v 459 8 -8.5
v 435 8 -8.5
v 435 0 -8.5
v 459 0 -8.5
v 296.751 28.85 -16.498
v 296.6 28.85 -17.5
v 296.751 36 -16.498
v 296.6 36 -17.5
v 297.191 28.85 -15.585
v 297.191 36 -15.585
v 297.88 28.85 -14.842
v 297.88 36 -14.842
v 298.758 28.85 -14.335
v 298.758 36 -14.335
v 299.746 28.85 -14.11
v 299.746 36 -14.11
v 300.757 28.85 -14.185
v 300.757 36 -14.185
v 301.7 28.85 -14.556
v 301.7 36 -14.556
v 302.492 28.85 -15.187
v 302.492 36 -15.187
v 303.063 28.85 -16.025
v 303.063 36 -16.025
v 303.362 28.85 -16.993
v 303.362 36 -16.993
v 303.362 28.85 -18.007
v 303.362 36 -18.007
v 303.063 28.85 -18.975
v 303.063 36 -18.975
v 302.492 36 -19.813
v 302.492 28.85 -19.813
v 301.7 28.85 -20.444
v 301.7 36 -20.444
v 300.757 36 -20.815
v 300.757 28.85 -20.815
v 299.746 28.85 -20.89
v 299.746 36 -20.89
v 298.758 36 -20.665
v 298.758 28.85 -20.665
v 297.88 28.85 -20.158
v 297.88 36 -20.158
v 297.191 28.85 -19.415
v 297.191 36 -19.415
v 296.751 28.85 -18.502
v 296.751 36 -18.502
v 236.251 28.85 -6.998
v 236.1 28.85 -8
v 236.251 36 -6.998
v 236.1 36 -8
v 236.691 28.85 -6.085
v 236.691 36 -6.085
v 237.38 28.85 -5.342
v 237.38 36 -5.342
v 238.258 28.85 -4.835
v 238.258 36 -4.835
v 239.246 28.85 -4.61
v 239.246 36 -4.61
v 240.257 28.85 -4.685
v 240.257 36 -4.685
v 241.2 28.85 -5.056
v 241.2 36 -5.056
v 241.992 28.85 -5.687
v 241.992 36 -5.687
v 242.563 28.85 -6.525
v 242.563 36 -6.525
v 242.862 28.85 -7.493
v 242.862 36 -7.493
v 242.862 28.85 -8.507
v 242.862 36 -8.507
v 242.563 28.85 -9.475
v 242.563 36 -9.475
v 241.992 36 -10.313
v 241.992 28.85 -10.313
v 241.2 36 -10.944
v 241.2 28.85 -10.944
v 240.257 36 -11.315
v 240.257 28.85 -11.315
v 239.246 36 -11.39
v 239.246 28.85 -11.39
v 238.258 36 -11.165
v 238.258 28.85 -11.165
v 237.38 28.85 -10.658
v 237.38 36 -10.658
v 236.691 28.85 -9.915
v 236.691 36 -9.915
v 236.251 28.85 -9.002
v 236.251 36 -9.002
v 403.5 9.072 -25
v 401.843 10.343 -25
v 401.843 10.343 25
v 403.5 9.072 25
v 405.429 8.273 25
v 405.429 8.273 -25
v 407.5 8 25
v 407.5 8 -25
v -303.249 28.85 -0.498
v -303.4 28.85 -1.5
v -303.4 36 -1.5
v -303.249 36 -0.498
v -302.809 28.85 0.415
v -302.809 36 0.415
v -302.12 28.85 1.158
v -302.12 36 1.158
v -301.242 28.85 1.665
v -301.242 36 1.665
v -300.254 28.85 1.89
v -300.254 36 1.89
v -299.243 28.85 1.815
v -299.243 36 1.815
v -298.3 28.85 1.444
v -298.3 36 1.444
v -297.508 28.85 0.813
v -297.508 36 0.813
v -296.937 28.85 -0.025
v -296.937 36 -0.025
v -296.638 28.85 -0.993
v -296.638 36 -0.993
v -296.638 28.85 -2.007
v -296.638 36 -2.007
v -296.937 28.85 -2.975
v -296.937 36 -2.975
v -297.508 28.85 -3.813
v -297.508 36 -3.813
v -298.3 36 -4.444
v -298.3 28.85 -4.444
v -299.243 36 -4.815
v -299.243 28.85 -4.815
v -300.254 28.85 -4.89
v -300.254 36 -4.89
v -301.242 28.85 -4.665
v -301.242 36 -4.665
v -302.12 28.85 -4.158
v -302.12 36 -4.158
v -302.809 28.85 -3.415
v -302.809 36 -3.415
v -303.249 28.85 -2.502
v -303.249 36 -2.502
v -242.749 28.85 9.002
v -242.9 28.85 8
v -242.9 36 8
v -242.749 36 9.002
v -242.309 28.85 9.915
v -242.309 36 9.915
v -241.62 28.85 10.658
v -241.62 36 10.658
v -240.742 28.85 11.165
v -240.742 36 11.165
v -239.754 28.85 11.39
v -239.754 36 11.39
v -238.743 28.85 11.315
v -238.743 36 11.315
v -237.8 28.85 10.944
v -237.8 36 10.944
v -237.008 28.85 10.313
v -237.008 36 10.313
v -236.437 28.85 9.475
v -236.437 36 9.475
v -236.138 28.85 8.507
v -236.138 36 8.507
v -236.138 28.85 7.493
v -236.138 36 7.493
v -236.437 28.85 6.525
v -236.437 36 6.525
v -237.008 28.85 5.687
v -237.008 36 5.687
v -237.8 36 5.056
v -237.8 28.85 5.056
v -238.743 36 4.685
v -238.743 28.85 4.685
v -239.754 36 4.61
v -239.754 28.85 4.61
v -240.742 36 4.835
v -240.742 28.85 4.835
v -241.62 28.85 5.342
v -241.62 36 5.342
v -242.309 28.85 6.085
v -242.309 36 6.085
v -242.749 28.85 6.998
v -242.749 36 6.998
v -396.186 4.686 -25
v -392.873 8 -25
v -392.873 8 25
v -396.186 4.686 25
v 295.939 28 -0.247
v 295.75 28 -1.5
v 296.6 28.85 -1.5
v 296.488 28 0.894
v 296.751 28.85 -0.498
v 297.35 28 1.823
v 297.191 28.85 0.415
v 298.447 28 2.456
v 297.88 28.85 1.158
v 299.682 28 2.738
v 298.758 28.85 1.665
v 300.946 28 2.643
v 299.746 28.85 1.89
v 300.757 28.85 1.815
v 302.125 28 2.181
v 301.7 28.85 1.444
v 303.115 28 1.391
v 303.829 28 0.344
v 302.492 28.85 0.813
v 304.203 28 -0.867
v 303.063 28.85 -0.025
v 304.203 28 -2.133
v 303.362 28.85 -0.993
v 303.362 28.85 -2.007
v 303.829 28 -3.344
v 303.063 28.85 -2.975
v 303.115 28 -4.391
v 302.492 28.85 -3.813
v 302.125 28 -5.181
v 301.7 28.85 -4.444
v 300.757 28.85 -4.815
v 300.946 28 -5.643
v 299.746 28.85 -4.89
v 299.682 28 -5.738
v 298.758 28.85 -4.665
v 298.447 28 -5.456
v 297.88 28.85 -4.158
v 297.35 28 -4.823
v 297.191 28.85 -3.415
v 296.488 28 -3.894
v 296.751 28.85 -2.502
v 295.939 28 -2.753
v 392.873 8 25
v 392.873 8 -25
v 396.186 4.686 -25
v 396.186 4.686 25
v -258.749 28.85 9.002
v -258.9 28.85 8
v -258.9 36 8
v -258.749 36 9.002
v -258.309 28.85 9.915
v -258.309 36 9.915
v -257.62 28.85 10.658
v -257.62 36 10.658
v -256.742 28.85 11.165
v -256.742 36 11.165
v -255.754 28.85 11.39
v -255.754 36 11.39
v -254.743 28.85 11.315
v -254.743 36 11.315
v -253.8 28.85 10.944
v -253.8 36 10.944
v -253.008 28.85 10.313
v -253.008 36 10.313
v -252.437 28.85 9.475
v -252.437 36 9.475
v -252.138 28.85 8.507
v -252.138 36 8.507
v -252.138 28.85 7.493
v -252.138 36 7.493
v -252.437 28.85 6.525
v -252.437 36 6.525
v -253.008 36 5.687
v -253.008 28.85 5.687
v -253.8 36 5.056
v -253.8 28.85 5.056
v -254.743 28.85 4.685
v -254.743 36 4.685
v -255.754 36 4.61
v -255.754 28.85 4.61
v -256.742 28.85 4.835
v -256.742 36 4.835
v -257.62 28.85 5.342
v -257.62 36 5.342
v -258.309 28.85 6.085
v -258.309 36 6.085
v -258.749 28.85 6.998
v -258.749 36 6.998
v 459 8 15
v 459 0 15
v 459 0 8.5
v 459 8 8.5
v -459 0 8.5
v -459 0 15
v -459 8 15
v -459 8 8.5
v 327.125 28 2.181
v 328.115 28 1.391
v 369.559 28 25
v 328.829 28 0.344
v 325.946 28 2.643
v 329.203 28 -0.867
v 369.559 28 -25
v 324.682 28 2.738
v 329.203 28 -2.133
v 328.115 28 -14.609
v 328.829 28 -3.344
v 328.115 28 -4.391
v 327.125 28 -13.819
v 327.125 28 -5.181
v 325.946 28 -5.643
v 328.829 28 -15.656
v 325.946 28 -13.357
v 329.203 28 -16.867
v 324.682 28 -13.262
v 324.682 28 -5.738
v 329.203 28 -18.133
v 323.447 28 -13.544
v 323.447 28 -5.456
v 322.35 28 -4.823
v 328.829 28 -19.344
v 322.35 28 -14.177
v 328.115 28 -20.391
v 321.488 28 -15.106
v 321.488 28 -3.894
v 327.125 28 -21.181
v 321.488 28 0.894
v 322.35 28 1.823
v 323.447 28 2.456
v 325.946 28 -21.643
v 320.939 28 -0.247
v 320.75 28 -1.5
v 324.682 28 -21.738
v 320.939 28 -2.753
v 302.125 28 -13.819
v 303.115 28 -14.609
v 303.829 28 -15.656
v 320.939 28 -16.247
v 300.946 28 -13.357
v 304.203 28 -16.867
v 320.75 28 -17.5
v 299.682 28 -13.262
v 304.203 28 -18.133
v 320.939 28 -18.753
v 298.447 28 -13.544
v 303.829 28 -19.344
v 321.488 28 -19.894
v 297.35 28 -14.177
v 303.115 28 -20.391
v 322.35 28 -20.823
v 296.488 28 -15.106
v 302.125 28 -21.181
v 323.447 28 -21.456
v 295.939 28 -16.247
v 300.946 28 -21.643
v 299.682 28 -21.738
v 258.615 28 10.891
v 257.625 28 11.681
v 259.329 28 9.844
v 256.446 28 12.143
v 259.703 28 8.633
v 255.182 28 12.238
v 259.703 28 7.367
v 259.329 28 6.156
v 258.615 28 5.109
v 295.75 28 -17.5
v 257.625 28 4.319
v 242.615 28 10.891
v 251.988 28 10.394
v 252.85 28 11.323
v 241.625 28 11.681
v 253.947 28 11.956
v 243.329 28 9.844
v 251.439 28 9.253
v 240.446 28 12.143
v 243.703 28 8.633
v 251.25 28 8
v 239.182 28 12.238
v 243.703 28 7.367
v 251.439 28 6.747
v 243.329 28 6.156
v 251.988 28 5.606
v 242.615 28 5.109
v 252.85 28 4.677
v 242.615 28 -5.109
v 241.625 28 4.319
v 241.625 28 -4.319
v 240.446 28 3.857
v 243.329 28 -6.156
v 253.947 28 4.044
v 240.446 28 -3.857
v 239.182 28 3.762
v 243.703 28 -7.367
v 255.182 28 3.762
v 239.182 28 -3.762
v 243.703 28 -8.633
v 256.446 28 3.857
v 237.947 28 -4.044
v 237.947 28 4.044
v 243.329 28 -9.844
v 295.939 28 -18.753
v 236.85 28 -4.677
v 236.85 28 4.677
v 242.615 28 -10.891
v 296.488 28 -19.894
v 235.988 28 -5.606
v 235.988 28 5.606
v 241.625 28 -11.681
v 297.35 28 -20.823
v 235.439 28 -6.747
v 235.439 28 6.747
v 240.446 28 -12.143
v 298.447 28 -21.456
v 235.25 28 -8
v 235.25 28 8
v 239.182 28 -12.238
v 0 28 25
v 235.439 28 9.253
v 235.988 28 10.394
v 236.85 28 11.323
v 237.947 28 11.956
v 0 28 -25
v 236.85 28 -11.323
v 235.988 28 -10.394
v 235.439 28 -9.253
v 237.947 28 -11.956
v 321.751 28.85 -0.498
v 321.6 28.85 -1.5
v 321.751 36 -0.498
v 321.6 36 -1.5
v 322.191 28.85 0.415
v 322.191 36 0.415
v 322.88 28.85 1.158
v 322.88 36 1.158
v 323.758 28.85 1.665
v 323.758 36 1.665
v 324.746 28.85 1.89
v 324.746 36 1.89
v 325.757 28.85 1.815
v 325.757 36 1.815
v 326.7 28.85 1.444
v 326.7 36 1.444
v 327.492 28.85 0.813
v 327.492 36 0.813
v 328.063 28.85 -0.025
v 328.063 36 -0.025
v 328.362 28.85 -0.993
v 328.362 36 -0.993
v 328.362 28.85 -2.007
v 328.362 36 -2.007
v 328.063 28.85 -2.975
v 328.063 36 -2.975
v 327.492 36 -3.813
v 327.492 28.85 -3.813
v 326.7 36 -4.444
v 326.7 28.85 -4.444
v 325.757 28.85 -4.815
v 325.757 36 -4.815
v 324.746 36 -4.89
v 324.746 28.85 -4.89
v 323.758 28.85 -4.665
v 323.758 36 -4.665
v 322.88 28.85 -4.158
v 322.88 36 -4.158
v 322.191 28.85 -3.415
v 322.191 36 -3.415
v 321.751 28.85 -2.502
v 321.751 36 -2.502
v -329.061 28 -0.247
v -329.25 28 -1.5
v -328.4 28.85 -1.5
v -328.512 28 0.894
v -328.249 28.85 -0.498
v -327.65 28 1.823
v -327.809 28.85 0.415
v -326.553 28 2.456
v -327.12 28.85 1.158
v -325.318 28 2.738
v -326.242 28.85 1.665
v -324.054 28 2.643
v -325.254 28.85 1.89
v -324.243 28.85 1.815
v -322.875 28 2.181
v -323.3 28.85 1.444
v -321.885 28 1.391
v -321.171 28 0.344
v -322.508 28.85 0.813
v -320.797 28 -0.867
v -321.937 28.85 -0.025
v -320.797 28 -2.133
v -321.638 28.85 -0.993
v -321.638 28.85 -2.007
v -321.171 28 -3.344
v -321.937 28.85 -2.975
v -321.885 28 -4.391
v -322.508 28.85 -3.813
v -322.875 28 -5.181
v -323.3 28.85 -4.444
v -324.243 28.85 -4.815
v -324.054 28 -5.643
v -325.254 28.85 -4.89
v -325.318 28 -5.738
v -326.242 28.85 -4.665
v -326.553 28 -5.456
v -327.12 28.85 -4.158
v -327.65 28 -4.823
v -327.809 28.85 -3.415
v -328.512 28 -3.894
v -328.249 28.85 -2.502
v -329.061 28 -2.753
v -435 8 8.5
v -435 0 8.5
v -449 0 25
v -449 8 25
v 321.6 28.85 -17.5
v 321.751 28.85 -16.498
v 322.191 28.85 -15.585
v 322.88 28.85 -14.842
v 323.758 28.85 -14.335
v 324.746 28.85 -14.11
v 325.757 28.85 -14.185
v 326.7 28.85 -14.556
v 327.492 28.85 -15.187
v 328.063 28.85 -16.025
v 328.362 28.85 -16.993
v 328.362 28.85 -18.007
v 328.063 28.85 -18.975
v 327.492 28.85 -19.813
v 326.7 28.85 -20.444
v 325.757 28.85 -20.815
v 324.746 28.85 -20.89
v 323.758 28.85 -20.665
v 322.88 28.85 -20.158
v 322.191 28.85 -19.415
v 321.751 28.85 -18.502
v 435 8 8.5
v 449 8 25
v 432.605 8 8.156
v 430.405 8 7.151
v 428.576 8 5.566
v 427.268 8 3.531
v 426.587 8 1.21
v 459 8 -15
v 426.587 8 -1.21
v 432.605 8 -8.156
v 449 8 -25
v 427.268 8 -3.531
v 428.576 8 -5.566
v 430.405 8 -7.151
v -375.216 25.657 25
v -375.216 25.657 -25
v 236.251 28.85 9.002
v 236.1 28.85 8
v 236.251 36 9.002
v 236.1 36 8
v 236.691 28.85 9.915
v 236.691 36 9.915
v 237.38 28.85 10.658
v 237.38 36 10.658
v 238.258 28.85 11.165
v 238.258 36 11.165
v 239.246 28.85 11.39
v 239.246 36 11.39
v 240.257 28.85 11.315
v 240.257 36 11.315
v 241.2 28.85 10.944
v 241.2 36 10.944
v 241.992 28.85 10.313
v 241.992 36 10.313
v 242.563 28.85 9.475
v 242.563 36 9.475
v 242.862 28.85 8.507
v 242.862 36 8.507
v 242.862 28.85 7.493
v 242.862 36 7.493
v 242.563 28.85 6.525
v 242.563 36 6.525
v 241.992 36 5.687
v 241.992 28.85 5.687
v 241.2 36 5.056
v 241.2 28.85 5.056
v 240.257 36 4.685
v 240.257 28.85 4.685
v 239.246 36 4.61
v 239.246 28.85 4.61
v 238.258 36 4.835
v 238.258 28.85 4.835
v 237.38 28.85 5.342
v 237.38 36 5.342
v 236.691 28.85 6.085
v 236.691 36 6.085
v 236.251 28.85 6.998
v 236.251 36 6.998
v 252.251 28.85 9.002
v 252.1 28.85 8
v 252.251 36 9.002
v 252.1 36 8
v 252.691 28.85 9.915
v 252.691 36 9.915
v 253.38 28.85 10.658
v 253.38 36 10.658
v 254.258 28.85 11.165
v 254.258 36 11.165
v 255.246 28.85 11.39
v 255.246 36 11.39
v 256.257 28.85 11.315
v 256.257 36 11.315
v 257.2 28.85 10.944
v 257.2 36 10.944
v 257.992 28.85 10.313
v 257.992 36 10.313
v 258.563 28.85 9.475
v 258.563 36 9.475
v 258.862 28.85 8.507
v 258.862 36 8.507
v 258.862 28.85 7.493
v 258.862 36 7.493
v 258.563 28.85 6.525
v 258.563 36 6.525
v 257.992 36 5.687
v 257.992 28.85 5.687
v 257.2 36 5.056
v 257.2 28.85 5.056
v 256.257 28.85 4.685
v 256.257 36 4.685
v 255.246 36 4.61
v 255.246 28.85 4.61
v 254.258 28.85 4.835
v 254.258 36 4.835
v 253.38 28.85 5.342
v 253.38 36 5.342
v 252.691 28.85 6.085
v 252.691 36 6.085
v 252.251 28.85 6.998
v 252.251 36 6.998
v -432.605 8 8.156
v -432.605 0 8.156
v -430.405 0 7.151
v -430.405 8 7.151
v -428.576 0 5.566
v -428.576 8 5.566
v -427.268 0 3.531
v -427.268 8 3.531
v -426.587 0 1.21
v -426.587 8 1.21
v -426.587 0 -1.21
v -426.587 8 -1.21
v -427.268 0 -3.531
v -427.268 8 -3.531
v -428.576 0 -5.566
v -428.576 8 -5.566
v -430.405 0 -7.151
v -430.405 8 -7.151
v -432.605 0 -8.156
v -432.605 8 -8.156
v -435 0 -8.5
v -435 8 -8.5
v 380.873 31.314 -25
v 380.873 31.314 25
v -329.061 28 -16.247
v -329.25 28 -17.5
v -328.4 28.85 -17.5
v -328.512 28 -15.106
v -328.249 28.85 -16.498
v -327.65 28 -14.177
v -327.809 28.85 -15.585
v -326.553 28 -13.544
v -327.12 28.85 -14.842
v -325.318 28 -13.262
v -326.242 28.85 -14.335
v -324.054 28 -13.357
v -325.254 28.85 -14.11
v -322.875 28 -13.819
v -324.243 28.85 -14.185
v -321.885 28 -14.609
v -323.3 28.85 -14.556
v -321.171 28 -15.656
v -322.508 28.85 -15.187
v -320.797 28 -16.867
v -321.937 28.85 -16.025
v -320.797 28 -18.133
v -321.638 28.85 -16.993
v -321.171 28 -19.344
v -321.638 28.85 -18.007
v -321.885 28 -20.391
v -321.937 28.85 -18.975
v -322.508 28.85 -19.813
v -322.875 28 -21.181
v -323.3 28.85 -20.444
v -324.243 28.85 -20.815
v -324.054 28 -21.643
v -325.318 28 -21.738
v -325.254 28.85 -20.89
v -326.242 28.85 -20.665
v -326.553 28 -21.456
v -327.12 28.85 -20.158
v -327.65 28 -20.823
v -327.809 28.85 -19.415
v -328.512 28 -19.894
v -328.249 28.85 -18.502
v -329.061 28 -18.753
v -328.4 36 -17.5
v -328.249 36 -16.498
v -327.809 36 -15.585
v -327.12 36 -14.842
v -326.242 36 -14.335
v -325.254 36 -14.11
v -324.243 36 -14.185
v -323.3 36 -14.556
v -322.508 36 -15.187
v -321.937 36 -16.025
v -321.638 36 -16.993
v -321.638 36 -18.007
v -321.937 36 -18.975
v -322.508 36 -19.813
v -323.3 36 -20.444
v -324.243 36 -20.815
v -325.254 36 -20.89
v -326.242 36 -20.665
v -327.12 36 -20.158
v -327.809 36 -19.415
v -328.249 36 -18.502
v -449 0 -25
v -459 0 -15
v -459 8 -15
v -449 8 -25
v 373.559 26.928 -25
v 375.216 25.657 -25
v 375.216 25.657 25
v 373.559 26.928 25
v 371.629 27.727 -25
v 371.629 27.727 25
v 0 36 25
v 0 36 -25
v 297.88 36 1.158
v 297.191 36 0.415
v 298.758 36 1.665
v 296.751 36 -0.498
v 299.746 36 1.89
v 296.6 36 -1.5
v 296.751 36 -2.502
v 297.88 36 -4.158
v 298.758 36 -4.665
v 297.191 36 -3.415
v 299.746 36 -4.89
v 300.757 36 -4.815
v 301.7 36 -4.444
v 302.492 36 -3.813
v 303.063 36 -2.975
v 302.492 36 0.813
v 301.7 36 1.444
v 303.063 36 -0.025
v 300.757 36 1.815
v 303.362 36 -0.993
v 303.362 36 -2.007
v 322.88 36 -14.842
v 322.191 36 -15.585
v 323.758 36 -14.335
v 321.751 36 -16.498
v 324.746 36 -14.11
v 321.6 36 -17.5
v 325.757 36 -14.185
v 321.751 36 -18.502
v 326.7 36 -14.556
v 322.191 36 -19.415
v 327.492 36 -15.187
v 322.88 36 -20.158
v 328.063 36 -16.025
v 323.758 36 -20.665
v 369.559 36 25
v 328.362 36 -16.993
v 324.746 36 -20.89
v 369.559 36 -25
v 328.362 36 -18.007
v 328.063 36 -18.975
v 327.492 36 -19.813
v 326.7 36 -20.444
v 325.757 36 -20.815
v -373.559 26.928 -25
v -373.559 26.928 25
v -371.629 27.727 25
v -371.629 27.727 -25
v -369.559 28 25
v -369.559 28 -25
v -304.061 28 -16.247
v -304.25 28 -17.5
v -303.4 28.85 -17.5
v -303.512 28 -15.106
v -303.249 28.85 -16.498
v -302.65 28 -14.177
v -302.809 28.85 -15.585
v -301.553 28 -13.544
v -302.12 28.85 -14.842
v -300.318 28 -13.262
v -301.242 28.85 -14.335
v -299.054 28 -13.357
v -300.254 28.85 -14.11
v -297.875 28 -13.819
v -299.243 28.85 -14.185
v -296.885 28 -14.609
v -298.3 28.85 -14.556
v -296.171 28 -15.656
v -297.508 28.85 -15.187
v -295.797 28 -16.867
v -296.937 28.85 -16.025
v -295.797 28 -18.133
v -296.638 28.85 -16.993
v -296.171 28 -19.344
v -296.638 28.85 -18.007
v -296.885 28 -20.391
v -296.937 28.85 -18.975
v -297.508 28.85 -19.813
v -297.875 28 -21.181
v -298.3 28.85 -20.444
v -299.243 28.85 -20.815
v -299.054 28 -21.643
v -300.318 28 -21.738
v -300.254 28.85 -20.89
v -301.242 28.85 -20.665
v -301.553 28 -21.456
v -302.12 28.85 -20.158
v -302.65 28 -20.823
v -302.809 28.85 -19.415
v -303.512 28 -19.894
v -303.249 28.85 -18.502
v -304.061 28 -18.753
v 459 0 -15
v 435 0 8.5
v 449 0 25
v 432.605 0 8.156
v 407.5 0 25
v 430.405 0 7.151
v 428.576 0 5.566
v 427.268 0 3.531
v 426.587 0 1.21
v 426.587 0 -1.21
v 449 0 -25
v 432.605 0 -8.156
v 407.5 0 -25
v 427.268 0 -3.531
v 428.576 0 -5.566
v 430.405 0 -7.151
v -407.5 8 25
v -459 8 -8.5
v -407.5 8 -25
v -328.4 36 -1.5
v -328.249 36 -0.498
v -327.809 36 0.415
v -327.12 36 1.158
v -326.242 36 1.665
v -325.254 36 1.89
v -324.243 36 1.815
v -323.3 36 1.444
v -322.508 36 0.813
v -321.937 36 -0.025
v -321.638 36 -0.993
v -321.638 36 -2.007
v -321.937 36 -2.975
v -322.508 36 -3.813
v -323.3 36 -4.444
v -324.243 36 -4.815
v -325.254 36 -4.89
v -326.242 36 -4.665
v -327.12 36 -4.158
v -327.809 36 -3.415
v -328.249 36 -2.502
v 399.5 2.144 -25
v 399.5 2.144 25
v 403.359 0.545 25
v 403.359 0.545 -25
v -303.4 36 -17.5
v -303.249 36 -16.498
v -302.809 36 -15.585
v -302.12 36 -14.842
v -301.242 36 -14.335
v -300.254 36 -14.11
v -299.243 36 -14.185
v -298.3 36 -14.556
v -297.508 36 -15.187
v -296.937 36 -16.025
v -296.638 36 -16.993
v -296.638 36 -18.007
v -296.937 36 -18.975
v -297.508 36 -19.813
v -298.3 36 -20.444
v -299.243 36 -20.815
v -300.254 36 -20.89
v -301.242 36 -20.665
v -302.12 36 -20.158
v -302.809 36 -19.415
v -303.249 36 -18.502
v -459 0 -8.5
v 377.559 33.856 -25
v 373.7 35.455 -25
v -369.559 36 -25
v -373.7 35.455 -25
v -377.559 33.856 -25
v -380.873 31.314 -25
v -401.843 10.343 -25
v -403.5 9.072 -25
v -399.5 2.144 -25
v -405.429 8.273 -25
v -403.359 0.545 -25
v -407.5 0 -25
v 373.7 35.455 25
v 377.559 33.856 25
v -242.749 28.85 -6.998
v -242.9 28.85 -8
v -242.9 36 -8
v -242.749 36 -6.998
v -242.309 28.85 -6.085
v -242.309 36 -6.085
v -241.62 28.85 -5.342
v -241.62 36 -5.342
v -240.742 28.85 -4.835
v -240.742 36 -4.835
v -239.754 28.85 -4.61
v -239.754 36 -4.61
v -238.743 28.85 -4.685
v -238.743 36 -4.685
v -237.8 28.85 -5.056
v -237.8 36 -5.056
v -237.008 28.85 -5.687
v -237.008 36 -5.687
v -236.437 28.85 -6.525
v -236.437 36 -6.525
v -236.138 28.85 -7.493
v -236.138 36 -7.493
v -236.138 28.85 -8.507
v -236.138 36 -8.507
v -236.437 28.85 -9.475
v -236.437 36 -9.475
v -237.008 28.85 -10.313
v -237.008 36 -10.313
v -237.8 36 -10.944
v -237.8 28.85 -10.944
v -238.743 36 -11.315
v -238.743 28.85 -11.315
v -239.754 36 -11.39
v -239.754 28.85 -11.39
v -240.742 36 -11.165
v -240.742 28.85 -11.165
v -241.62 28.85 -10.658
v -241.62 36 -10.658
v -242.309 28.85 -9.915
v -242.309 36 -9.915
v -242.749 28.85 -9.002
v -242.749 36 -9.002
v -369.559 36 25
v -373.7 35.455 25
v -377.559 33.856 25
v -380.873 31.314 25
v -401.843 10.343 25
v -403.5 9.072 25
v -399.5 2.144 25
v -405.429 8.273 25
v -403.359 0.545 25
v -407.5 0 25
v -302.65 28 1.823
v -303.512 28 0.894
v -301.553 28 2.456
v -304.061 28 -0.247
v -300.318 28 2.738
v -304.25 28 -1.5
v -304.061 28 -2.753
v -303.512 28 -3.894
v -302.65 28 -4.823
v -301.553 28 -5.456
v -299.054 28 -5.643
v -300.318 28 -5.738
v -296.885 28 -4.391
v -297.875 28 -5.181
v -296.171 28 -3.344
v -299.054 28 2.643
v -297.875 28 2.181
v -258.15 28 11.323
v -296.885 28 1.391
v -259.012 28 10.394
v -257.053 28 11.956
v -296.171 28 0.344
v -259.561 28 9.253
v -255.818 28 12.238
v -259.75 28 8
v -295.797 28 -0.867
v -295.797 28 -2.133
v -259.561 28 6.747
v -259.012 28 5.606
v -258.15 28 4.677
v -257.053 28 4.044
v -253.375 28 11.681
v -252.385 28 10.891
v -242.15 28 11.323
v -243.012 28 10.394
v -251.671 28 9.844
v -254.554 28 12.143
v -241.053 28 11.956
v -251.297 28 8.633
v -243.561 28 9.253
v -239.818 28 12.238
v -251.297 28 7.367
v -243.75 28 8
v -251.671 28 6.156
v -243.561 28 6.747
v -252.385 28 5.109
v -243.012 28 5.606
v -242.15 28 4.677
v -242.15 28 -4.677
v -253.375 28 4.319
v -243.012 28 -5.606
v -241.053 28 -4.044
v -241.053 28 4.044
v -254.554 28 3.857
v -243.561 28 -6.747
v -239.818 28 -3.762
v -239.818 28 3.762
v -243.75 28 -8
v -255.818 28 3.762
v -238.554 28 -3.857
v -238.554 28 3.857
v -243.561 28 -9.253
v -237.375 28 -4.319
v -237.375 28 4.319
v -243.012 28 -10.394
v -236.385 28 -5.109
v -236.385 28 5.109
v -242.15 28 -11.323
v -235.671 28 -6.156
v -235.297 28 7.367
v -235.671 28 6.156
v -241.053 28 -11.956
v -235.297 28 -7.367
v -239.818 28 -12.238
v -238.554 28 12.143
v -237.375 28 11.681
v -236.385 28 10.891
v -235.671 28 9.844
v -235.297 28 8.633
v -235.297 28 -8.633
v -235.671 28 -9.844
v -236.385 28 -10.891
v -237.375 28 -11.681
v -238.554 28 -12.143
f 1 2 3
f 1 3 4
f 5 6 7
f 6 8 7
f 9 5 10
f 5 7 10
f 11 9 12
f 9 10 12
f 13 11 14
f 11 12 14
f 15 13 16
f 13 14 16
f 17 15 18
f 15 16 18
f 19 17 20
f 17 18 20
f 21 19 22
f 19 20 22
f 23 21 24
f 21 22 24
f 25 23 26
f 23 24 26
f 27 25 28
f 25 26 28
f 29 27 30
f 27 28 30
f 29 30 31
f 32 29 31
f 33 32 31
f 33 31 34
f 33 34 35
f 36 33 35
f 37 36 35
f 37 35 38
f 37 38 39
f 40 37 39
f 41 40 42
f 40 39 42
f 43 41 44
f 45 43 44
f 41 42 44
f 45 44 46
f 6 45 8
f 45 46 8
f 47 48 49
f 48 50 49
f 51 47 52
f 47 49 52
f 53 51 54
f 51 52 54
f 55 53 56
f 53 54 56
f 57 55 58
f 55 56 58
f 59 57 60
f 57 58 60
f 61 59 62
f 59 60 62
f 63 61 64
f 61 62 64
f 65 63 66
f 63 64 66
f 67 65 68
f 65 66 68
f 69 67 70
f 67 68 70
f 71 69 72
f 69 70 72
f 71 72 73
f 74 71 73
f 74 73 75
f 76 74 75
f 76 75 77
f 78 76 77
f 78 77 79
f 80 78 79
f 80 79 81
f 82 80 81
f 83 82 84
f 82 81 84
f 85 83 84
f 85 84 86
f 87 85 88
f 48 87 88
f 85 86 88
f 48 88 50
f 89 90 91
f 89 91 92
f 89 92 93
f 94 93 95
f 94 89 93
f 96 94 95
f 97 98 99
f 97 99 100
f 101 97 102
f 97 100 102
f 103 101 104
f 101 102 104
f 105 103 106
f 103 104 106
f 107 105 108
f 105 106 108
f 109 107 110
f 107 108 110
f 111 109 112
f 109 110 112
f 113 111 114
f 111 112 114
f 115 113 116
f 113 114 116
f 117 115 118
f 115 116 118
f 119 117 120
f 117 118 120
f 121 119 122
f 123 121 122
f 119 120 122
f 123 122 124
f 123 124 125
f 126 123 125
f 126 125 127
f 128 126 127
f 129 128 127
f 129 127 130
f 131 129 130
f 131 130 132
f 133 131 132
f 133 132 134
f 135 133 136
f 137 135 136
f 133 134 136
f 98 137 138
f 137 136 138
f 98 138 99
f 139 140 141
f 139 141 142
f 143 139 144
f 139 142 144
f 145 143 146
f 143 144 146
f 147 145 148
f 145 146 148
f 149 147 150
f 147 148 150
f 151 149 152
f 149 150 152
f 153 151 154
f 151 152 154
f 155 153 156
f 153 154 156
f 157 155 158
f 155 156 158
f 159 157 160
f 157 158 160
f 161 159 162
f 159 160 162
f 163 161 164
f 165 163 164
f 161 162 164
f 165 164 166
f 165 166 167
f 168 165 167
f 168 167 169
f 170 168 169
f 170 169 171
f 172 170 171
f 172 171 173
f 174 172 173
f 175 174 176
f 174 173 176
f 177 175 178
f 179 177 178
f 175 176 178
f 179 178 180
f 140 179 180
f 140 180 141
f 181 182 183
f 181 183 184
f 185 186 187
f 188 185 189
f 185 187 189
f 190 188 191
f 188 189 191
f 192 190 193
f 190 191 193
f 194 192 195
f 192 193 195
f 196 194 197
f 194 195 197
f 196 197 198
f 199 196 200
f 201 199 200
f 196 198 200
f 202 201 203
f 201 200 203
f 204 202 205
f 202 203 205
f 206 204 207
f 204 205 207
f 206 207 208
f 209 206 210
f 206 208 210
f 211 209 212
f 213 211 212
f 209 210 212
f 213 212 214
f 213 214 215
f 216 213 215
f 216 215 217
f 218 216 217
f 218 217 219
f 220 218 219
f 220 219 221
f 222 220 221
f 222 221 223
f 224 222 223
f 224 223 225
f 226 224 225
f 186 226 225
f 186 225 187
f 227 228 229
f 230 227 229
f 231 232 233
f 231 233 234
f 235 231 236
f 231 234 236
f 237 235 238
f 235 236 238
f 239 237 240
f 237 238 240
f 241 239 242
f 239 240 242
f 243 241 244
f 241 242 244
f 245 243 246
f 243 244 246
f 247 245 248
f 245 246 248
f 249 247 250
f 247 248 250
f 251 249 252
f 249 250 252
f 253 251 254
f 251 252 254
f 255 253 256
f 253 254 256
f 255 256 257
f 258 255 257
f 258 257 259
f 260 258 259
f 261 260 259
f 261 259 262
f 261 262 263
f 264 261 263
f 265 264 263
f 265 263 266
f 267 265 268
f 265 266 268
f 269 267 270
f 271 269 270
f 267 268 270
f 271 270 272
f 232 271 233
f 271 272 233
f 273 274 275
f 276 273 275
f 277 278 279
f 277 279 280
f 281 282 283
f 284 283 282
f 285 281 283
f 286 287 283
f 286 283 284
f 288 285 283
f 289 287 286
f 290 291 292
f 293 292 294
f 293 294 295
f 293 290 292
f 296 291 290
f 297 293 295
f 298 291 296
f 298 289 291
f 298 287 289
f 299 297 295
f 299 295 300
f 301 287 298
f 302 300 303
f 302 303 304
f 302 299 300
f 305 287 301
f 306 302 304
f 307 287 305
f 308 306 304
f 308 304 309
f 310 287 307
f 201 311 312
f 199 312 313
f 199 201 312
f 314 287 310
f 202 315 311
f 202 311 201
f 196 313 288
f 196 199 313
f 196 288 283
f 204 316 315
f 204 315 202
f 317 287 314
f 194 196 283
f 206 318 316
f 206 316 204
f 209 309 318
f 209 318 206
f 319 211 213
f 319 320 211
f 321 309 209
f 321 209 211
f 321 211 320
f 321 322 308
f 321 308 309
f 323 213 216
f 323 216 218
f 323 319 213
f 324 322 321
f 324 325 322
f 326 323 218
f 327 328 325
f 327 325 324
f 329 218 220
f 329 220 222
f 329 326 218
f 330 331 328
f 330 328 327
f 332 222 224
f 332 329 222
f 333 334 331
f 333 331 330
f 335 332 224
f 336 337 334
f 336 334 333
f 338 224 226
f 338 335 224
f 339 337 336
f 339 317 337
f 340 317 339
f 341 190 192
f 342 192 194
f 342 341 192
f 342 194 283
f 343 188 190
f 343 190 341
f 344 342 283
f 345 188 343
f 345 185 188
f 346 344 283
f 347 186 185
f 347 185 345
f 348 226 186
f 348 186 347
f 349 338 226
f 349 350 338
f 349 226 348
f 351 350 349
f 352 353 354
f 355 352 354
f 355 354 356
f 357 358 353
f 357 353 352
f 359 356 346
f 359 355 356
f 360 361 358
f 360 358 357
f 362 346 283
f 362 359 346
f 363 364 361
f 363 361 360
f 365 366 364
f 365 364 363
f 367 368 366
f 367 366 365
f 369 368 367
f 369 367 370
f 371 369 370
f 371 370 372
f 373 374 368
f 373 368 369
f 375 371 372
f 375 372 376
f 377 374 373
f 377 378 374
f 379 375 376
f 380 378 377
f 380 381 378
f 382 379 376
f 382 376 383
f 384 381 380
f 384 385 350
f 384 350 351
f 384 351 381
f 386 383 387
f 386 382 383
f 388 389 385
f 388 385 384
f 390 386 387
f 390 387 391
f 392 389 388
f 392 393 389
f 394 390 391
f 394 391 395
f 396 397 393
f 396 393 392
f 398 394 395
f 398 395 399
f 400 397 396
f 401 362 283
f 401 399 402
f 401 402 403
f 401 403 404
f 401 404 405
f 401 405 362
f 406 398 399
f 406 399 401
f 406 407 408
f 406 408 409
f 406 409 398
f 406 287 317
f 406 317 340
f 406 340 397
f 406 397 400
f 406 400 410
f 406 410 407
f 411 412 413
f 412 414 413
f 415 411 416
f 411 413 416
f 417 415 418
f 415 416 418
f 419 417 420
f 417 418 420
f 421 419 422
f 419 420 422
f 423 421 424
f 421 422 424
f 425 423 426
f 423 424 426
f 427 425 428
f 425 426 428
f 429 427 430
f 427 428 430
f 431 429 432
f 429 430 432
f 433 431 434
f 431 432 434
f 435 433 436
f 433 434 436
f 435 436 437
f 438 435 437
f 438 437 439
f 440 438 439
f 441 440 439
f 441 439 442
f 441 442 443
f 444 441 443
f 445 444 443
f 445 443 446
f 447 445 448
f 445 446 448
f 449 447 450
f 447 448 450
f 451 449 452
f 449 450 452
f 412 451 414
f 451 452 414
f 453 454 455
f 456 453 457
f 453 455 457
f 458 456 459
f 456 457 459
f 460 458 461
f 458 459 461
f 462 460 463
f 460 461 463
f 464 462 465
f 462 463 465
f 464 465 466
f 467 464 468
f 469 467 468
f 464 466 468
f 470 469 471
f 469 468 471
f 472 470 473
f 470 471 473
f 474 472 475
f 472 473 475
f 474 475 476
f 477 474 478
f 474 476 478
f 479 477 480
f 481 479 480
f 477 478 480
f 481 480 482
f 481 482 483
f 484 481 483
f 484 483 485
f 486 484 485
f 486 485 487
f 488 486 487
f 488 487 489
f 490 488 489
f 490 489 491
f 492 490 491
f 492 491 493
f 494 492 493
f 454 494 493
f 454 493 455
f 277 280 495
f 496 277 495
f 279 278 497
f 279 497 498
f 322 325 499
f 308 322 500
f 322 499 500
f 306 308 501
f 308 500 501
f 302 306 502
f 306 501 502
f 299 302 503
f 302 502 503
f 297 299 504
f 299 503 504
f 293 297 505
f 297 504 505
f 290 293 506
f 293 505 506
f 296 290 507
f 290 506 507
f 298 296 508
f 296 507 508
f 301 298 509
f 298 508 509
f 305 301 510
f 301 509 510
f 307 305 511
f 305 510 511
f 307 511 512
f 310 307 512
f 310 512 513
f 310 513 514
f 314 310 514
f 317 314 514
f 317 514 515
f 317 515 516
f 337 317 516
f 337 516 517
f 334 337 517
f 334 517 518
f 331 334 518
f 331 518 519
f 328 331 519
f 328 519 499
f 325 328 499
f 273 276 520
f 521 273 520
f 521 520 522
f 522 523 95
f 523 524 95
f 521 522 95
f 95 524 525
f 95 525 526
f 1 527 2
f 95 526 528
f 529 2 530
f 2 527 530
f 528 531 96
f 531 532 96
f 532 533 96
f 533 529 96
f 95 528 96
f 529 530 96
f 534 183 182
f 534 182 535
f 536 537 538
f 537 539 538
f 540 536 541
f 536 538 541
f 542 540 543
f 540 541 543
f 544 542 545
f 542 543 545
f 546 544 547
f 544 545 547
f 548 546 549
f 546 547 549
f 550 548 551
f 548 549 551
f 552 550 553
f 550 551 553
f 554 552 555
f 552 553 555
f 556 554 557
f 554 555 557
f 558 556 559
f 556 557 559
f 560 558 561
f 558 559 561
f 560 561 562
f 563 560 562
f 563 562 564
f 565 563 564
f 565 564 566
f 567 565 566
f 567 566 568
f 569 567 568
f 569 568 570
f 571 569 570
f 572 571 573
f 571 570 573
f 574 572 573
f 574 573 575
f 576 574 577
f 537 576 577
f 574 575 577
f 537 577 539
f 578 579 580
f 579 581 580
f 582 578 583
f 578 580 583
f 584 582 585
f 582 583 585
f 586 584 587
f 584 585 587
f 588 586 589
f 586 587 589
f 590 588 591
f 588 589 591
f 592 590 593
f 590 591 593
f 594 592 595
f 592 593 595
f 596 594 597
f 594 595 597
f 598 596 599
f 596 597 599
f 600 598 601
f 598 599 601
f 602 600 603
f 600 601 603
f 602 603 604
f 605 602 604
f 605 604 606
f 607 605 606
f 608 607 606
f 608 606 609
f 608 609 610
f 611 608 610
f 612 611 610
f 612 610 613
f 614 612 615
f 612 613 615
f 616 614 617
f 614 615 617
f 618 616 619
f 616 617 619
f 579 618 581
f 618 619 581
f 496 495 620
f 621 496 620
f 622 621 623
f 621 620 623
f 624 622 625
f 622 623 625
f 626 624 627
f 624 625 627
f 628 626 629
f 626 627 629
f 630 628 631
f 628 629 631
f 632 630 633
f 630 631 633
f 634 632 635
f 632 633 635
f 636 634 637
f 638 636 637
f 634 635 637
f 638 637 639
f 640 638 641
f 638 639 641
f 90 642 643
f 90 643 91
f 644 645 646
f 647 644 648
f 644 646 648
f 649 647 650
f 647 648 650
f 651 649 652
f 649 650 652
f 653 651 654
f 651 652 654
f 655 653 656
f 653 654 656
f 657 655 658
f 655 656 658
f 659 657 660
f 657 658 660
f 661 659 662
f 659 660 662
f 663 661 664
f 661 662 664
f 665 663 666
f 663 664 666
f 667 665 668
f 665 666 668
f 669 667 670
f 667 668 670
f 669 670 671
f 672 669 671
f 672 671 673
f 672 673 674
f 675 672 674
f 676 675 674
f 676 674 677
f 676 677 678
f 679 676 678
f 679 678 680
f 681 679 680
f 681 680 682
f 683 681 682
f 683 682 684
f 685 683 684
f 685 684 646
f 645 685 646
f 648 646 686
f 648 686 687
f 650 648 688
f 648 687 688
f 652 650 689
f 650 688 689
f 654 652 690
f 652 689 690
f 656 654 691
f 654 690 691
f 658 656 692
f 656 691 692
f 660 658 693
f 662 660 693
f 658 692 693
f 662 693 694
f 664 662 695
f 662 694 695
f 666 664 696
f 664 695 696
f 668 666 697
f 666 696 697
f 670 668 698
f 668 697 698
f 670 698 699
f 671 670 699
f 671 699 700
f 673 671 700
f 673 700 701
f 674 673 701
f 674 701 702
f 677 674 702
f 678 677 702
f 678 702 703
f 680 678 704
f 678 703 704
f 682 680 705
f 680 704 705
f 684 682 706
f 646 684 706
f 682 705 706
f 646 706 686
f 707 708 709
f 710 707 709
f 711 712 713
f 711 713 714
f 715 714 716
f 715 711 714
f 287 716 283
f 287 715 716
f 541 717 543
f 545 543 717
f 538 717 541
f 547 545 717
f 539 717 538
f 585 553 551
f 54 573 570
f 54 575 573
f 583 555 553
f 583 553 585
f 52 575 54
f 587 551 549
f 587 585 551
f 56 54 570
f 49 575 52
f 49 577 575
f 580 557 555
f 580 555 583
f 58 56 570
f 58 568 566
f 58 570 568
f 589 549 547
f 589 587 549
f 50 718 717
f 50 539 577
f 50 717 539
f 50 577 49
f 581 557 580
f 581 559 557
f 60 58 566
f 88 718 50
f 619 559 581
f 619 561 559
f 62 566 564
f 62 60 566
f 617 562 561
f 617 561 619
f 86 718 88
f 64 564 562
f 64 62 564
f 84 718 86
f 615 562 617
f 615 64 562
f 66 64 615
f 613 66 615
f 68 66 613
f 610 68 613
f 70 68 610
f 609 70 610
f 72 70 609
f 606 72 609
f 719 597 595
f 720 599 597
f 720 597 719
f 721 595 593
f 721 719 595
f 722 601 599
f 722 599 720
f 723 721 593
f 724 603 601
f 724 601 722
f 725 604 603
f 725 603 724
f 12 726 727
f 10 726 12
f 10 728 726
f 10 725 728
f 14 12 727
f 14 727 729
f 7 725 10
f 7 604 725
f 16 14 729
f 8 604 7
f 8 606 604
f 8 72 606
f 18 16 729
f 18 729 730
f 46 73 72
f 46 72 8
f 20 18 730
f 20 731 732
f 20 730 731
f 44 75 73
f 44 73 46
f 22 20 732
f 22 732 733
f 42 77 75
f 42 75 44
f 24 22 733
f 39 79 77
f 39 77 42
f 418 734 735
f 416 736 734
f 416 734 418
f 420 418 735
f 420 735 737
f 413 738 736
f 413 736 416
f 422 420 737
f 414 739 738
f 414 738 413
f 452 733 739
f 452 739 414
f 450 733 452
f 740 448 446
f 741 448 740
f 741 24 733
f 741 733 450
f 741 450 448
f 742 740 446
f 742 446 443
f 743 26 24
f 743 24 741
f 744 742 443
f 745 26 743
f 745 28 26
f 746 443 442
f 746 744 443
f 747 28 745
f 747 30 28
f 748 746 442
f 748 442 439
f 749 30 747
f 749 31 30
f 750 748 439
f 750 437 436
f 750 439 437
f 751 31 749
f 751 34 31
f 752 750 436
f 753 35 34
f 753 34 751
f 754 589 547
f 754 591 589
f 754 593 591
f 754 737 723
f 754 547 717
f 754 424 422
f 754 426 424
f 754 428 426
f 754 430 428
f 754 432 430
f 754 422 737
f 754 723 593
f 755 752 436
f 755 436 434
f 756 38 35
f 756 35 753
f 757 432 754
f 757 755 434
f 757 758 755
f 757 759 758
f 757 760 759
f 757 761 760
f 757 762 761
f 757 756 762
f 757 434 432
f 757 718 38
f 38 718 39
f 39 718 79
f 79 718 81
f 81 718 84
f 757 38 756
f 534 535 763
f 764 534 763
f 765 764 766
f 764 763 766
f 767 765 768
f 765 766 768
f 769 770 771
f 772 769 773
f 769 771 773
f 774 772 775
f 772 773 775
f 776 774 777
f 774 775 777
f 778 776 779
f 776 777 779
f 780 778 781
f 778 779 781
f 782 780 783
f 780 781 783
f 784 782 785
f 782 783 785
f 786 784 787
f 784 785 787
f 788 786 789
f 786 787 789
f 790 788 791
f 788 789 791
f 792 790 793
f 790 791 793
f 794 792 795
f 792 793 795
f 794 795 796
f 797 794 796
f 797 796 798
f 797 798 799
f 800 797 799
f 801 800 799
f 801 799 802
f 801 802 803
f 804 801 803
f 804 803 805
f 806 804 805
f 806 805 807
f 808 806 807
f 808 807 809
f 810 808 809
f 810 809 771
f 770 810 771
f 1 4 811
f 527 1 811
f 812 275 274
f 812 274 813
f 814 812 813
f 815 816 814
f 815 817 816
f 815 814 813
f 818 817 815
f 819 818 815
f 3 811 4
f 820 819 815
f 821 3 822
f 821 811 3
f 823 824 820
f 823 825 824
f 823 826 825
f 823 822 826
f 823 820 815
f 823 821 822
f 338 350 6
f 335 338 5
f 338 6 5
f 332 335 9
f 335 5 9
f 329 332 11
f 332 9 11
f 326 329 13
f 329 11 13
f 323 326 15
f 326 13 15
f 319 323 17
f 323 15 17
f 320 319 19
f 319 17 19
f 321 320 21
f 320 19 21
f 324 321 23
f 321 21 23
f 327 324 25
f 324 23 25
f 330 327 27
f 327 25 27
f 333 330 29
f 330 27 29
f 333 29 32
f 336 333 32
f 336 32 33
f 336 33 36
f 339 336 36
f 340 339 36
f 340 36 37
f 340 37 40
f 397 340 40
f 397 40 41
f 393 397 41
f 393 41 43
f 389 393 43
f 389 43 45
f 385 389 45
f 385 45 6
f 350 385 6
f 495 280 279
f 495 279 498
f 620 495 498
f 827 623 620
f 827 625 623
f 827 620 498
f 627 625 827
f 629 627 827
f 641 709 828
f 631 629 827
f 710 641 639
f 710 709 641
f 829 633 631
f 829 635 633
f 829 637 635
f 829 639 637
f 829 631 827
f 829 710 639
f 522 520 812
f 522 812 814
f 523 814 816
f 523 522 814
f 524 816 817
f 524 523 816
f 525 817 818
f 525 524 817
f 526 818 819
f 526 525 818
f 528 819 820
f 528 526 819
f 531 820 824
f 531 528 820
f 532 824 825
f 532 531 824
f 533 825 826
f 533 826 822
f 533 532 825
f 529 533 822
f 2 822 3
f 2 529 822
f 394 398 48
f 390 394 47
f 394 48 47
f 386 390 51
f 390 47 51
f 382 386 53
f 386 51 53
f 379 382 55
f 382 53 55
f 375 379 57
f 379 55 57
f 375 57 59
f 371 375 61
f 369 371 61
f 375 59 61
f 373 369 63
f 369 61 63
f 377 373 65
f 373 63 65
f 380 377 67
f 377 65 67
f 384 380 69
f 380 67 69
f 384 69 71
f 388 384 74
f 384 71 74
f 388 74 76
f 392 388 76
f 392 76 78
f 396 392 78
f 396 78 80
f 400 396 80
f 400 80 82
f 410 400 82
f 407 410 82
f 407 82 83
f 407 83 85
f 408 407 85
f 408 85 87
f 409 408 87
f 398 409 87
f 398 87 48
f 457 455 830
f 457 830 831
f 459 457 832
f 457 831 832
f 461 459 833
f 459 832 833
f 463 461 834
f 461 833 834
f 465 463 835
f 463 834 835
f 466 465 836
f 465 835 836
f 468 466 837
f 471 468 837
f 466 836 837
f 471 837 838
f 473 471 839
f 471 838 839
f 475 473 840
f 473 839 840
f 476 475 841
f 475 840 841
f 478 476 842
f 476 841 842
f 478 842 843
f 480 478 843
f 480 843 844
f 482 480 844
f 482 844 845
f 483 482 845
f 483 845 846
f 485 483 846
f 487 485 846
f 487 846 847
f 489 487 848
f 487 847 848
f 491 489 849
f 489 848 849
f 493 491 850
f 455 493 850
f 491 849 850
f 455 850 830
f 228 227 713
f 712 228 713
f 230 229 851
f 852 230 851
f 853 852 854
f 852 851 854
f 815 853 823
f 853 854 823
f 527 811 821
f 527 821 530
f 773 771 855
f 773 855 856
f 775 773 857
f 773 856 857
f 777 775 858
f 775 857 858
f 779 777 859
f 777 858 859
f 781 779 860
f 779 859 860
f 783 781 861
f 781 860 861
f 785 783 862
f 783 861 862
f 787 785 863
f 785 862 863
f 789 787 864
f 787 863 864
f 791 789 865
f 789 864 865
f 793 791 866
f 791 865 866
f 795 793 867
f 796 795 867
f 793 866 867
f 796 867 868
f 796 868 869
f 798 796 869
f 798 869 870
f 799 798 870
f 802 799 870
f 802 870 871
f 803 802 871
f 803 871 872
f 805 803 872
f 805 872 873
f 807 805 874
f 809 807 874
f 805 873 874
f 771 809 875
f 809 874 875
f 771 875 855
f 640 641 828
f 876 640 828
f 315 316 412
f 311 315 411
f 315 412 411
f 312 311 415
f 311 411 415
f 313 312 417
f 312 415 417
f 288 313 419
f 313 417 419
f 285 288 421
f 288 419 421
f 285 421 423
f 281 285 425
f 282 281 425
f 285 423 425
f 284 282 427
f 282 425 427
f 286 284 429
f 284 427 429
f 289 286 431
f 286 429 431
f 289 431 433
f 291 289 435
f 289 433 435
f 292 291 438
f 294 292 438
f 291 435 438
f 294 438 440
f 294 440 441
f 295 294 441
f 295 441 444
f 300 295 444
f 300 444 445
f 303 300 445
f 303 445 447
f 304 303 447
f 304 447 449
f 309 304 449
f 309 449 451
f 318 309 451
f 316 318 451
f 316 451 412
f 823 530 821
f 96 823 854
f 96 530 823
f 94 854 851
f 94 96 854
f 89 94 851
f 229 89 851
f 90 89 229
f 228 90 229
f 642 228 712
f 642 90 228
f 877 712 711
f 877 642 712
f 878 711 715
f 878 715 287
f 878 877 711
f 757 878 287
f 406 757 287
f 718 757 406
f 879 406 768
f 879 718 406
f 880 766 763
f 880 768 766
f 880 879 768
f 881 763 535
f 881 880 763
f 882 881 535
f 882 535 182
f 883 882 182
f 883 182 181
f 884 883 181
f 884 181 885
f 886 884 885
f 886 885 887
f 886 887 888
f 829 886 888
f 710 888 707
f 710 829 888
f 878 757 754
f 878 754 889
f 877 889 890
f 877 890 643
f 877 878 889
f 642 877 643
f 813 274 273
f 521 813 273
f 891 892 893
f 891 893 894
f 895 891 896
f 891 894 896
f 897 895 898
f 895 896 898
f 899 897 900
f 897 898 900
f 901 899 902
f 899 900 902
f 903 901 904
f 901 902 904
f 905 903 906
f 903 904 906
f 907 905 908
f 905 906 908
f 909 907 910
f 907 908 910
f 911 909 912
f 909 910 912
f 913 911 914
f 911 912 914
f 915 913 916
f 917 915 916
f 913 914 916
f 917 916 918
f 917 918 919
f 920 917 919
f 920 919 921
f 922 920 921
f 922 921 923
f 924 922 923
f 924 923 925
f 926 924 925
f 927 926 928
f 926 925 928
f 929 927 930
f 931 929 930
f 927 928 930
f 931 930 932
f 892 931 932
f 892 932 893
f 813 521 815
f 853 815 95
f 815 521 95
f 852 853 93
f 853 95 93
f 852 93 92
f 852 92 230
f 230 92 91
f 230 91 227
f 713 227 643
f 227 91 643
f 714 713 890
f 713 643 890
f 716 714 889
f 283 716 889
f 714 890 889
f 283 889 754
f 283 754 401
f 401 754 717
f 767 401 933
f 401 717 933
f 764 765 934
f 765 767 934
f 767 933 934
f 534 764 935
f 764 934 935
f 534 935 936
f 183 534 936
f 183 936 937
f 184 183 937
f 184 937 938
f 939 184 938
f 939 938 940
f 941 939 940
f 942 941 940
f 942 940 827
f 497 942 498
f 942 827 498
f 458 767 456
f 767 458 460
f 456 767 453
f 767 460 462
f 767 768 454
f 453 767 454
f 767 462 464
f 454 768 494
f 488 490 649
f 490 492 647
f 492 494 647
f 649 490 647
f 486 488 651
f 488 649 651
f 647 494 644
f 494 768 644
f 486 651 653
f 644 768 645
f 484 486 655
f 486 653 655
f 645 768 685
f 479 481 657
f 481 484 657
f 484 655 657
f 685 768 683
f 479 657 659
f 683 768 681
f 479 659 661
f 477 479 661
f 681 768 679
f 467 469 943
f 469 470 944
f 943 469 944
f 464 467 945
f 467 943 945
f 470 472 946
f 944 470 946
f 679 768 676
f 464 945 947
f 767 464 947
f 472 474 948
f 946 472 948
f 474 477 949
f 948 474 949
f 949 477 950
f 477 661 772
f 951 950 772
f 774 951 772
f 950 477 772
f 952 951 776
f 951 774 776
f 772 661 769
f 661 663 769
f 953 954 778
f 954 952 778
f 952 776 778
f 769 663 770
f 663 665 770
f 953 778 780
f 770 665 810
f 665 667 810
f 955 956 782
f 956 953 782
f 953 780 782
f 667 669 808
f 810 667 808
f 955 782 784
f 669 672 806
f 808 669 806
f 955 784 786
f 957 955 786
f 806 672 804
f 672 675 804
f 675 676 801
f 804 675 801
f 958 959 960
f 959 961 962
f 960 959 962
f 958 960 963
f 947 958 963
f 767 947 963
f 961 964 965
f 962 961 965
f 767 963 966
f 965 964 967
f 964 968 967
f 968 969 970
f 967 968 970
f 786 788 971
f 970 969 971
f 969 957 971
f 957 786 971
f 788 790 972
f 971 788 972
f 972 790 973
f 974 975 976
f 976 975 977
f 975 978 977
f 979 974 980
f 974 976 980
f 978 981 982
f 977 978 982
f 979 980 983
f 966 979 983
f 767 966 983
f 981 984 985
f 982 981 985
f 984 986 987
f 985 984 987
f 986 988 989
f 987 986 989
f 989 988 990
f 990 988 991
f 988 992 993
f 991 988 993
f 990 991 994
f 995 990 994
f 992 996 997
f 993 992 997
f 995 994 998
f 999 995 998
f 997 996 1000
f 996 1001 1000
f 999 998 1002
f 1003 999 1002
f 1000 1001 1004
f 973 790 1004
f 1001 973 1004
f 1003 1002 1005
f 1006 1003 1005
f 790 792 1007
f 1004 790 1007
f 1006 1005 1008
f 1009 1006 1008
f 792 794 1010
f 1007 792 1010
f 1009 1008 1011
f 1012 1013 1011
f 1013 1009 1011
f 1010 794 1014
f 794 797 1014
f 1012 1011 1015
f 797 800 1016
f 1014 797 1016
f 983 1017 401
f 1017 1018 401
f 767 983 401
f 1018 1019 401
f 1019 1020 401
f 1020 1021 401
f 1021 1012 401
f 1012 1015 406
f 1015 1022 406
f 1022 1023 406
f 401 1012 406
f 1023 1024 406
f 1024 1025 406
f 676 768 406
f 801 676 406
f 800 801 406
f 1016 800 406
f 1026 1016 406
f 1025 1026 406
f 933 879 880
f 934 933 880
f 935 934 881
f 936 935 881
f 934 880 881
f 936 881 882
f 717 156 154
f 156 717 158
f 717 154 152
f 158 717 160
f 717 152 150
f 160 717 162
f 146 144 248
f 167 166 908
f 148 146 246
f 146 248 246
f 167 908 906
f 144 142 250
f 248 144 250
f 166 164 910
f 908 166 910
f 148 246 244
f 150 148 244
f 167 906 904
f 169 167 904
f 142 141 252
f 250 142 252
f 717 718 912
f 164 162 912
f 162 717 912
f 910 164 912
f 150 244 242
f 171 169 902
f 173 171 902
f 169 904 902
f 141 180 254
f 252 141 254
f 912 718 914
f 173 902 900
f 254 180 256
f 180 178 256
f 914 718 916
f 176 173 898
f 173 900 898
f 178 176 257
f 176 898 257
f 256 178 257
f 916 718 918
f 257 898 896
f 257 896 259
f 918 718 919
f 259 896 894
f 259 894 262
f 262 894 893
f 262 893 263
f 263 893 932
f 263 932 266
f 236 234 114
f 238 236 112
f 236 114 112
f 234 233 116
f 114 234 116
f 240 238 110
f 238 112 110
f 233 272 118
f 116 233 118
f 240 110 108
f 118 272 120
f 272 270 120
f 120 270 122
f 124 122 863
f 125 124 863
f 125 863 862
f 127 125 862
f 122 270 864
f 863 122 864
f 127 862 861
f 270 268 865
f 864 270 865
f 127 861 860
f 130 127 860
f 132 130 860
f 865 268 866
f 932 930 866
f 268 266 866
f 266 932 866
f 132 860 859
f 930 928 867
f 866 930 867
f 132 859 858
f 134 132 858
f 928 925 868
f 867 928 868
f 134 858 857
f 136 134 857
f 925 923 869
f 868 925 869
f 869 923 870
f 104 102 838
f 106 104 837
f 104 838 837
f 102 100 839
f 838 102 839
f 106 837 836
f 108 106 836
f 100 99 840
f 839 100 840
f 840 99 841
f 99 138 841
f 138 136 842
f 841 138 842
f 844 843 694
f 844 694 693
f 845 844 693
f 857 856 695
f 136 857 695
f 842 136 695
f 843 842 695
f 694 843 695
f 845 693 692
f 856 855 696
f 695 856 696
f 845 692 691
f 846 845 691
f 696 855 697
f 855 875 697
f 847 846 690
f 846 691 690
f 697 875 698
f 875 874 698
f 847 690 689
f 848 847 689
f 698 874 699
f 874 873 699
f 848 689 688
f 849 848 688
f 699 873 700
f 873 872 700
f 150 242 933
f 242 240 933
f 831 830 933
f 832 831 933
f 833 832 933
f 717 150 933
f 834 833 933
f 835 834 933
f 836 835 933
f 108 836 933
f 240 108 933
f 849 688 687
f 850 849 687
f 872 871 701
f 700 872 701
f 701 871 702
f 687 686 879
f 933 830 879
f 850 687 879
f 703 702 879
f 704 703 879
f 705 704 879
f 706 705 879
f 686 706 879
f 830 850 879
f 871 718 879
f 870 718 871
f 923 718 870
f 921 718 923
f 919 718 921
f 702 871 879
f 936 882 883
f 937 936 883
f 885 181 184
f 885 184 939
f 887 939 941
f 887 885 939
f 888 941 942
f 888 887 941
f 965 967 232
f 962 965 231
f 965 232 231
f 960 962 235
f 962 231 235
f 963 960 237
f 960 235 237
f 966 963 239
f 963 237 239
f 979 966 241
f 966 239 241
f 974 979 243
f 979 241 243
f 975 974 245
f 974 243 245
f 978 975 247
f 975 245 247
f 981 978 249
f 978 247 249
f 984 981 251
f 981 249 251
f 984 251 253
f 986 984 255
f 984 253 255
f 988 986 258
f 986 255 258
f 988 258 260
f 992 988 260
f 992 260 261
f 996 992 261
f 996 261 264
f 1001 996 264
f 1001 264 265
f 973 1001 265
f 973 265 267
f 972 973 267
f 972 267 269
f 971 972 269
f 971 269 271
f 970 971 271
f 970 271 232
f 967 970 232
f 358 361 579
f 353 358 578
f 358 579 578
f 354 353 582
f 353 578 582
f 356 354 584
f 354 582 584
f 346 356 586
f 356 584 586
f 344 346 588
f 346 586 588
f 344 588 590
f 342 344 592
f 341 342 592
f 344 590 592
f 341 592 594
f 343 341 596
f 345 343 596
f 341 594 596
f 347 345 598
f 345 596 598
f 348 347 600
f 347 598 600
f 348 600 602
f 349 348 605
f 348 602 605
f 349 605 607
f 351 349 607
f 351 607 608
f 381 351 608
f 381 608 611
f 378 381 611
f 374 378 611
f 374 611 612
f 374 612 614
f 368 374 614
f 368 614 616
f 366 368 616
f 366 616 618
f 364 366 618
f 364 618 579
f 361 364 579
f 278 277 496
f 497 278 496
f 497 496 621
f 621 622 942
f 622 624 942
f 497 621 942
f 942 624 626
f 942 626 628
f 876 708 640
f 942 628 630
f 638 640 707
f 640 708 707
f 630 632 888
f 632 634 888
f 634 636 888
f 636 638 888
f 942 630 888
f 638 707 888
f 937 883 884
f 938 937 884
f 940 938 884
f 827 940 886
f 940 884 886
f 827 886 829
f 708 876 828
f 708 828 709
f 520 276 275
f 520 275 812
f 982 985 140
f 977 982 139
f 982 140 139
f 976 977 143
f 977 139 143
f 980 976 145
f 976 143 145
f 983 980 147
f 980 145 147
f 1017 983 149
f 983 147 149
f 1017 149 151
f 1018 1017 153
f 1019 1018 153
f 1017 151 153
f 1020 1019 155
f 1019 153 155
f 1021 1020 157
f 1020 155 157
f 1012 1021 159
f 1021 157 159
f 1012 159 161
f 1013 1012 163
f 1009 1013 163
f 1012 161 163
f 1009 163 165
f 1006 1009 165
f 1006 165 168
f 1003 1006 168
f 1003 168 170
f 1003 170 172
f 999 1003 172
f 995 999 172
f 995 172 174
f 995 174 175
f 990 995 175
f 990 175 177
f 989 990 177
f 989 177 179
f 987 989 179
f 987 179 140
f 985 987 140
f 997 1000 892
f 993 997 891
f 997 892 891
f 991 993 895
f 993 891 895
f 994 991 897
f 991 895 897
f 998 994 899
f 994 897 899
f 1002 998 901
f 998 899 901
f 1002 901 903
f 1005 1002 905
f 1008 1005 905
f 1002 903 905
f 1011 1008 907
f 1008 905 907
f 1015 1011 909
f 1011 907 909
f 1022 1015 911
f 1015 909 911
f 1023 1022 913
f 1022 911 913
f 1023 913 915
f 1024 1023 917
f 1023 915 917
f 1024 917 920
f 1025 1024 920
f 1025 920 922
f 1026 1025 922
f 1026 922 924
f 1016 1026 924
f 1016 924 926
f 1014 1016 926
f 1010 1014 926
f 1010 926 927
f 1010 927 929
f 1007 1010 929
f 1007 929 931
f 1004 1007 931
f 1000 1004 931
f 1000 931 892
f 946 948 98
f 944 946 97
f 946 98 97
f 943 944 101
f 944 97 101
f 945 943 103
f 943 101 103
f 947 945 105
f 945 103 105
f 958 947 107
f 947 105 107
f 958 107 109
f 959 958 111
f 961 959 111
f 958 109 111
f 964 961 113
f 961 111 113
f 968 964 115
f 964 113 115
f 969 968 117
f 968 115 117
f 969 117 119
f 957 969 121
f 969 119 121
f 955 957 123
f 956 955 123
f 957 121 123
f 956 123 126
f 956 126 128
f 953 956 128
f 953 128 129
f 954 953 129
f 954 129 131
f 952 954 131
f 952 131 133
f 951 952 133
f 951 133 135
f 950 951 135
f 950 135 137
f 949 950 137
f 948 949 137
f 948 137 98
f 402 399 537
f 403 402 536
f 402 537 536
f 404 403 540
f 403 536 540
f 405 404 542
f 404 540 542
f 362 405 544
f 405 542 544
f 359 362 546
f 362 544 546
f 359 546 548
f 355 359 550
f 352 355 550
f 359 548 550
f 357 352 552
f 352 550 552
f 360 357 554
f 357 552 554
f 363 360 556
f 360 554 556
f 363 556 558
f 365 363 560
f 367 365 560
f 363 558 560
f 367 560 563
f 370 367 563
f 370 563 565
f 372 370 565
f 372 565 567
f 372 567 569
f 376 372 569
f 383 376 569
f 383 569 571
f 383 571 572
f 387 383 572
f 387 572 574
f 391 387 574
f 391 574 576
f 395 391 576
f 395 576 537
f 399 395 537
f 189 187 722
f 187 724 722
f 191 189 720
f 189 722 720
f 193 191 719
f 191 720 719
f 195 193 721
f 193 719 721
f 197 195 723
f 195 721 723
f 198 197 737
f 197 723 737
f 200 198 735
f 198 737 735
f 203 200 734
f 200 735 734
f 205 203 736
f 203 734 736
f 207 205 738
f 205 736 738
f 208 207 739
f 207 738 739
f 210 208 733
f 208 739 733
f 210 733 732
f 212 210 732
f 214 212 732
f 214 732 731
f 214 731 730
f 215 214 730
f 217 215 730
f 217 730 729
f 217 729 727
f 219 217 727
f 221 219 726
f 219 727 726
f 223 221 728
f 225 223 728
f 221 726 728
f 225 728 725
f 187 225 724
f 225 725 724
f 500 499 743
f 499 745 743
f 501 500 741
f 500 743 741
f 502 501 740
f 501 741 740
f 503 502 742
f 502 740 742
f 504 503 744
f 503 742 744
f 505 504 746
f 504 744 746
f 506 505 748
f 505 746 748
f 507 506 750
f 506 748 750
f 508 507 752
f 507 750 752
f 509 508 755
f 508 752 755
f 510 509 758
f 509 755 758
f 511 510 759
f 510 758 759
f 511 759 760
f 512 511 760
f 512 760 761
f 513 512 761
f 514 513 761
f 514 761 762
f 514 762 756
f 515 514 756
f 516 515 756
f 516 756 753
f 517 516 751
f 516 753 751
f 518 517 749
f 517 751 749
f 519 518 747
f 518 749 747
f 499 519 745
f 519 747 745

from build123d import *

# Parameters (mm, degrees)
SKETCH_1_W             = 459
SKETCH_1_H             = 50
SM_BASE_FLANGE_1_DEPTH = 8
OTHER_START            = -25
OTHER_1_DEPTH          = 50
OTHER_1_2_DEPTH        = 50
CHAMFER_1_SIZE         = 10
CUT_EXTRUDE_1_DEPTH    = 461.532300713
M8X1_251_D             = 6.8
M8X1_251_CSINK_D       = 8.5
M8X1_251_CSINK_ANGLE   = 90


# Read off the part's stored shape, not the designer's step: Изгиб1
# Sheet-metal steps are written as plain solids
with BuildPart() as part:
    # Sketch 1 → Базовая кромка1 (new body)
    with BuildSketch(Plane(origin=(0, 0, 0), x_dir=(1, 0, 0), z_dir=(0, 1, 0))):
        with Locations((-229.5, 0)):
            Rectangle(SKETCH_1_W, SKETCH_1_H)
    extrude(amount=SM_BASE_FLANGE_1_DEPTH)

    # Other 1 outline → Other 1 (cut)
    with BuildSketch(Plane.XY.offset(OTHER_START)):
        with BuildLine():
            Line((-392.872583002, 8), (-396.186291703, 4.686291703))
            ThreePointArc((-396.186291703, 4.686291703), (-401.377065191, 1.217927743), (-407.5, 2.85e-07))
            Line((-407.5, 2.85e-07), (0, 0))
            Line((0, 0), (0, 8))
            Line((0, 8), (-392.872583002, 8))
        make_face()
    extrude(amount=OTHER_1_DEPTH, mode=Mode.SUBTRACT)

    # Other 1 2 outline → Other 1 2 (add)
    with BuildSketch(Plane.XY.offset(OTHER_START)):
        with BuildLine():
            Line((-407.5, 8.000000285), (-392.872583002, 8))
            Line((-392.872583002, 8), (-375.21572863, 25.656854127))
            ThreePointArc((-375.21572863, 25.656854127), (-372.620341896, 27.3910361), (-369.558874503, 27.999999827))
            Line((-369.558874503, 27.999999827), (0, 28))
            Line((0, 28), (0, 36))
            Line((0, 36), (-369.558874503, 35.999999827))
            ThreePointArc((-369.558874503, 35.999999827), (-375.681809355, 34.78207236), (-380.87258288, 31.313708377))
            Line((-380.87258288, 31.313708377), (-401.843145952, 10.343145952))
            ThreePointArc((-401.843145952, 10.343145952), (-404.43853265, 8.608964003), (-407.5, 8.000000285))
        make_face()
    extrude(amount=OTHER_1_2_DEPTH)

    # Фаска1
    chamfer_1_edges = [part.edges().sort_by_distance(p)[0] for p in [
        (-459, 4, -25),
        (-459, 4, 25),
    ]]
    chamfer(chamfer_1_edges, length=CHAMFER_1_SIZE)

    # Эскиз4 → Вытянуть1 (cut, through all)
    with BuildSketch(Plane(origin=(0, 8, 0), x_dir=(1, 0, 0), z_dir=(0, 1, 0))):
        with BuildLine():
            Line((-435, 8.5), (-459, 8.5))
            Line((-459, 8.5), (-459, -8.5))
            Line((-459, -8.5), (-435, -8.5))
            ThreePointArc((-435, -8.5), (-426.5, 0), (-435, 8.5))
        make_face()
    extrude(amount=-CUT_EXTRUDE_1_DEPTH, mode=Mode.SUBTRACT)

    # Зеркальное отражение1: part across plane


with BuildPart() as part_1:
    add(part.part)
    add(part.part.mirror(Plane(origin=(0, 36, -25), x_dir=(0, 0, 1), z_dir=(-1, 0, 0))))

    # Отверстие обработанное метчиком M8x1.251 (through all)
    with Locations(Plane.XZ.offset(-28)):
        with Locations((-325, -1.5), (-300, -1.5), (-300, -17.5), (-325, -17.5), (300, -1.5), (325, -1.5), (325, -17.5), (300, -17.5), (-255.5, 8), (-239.5, -8), (-239.5, 8), (239.5, 8), (239.5, -8), (255.5, 8)):
            CounterSinkHole(M8X1_251_D / 2, M8X1_251_CSINK_D / 2, counter_sink_angle=M8X1_251_CSINK_ANGLE)


solid = part_1.part
